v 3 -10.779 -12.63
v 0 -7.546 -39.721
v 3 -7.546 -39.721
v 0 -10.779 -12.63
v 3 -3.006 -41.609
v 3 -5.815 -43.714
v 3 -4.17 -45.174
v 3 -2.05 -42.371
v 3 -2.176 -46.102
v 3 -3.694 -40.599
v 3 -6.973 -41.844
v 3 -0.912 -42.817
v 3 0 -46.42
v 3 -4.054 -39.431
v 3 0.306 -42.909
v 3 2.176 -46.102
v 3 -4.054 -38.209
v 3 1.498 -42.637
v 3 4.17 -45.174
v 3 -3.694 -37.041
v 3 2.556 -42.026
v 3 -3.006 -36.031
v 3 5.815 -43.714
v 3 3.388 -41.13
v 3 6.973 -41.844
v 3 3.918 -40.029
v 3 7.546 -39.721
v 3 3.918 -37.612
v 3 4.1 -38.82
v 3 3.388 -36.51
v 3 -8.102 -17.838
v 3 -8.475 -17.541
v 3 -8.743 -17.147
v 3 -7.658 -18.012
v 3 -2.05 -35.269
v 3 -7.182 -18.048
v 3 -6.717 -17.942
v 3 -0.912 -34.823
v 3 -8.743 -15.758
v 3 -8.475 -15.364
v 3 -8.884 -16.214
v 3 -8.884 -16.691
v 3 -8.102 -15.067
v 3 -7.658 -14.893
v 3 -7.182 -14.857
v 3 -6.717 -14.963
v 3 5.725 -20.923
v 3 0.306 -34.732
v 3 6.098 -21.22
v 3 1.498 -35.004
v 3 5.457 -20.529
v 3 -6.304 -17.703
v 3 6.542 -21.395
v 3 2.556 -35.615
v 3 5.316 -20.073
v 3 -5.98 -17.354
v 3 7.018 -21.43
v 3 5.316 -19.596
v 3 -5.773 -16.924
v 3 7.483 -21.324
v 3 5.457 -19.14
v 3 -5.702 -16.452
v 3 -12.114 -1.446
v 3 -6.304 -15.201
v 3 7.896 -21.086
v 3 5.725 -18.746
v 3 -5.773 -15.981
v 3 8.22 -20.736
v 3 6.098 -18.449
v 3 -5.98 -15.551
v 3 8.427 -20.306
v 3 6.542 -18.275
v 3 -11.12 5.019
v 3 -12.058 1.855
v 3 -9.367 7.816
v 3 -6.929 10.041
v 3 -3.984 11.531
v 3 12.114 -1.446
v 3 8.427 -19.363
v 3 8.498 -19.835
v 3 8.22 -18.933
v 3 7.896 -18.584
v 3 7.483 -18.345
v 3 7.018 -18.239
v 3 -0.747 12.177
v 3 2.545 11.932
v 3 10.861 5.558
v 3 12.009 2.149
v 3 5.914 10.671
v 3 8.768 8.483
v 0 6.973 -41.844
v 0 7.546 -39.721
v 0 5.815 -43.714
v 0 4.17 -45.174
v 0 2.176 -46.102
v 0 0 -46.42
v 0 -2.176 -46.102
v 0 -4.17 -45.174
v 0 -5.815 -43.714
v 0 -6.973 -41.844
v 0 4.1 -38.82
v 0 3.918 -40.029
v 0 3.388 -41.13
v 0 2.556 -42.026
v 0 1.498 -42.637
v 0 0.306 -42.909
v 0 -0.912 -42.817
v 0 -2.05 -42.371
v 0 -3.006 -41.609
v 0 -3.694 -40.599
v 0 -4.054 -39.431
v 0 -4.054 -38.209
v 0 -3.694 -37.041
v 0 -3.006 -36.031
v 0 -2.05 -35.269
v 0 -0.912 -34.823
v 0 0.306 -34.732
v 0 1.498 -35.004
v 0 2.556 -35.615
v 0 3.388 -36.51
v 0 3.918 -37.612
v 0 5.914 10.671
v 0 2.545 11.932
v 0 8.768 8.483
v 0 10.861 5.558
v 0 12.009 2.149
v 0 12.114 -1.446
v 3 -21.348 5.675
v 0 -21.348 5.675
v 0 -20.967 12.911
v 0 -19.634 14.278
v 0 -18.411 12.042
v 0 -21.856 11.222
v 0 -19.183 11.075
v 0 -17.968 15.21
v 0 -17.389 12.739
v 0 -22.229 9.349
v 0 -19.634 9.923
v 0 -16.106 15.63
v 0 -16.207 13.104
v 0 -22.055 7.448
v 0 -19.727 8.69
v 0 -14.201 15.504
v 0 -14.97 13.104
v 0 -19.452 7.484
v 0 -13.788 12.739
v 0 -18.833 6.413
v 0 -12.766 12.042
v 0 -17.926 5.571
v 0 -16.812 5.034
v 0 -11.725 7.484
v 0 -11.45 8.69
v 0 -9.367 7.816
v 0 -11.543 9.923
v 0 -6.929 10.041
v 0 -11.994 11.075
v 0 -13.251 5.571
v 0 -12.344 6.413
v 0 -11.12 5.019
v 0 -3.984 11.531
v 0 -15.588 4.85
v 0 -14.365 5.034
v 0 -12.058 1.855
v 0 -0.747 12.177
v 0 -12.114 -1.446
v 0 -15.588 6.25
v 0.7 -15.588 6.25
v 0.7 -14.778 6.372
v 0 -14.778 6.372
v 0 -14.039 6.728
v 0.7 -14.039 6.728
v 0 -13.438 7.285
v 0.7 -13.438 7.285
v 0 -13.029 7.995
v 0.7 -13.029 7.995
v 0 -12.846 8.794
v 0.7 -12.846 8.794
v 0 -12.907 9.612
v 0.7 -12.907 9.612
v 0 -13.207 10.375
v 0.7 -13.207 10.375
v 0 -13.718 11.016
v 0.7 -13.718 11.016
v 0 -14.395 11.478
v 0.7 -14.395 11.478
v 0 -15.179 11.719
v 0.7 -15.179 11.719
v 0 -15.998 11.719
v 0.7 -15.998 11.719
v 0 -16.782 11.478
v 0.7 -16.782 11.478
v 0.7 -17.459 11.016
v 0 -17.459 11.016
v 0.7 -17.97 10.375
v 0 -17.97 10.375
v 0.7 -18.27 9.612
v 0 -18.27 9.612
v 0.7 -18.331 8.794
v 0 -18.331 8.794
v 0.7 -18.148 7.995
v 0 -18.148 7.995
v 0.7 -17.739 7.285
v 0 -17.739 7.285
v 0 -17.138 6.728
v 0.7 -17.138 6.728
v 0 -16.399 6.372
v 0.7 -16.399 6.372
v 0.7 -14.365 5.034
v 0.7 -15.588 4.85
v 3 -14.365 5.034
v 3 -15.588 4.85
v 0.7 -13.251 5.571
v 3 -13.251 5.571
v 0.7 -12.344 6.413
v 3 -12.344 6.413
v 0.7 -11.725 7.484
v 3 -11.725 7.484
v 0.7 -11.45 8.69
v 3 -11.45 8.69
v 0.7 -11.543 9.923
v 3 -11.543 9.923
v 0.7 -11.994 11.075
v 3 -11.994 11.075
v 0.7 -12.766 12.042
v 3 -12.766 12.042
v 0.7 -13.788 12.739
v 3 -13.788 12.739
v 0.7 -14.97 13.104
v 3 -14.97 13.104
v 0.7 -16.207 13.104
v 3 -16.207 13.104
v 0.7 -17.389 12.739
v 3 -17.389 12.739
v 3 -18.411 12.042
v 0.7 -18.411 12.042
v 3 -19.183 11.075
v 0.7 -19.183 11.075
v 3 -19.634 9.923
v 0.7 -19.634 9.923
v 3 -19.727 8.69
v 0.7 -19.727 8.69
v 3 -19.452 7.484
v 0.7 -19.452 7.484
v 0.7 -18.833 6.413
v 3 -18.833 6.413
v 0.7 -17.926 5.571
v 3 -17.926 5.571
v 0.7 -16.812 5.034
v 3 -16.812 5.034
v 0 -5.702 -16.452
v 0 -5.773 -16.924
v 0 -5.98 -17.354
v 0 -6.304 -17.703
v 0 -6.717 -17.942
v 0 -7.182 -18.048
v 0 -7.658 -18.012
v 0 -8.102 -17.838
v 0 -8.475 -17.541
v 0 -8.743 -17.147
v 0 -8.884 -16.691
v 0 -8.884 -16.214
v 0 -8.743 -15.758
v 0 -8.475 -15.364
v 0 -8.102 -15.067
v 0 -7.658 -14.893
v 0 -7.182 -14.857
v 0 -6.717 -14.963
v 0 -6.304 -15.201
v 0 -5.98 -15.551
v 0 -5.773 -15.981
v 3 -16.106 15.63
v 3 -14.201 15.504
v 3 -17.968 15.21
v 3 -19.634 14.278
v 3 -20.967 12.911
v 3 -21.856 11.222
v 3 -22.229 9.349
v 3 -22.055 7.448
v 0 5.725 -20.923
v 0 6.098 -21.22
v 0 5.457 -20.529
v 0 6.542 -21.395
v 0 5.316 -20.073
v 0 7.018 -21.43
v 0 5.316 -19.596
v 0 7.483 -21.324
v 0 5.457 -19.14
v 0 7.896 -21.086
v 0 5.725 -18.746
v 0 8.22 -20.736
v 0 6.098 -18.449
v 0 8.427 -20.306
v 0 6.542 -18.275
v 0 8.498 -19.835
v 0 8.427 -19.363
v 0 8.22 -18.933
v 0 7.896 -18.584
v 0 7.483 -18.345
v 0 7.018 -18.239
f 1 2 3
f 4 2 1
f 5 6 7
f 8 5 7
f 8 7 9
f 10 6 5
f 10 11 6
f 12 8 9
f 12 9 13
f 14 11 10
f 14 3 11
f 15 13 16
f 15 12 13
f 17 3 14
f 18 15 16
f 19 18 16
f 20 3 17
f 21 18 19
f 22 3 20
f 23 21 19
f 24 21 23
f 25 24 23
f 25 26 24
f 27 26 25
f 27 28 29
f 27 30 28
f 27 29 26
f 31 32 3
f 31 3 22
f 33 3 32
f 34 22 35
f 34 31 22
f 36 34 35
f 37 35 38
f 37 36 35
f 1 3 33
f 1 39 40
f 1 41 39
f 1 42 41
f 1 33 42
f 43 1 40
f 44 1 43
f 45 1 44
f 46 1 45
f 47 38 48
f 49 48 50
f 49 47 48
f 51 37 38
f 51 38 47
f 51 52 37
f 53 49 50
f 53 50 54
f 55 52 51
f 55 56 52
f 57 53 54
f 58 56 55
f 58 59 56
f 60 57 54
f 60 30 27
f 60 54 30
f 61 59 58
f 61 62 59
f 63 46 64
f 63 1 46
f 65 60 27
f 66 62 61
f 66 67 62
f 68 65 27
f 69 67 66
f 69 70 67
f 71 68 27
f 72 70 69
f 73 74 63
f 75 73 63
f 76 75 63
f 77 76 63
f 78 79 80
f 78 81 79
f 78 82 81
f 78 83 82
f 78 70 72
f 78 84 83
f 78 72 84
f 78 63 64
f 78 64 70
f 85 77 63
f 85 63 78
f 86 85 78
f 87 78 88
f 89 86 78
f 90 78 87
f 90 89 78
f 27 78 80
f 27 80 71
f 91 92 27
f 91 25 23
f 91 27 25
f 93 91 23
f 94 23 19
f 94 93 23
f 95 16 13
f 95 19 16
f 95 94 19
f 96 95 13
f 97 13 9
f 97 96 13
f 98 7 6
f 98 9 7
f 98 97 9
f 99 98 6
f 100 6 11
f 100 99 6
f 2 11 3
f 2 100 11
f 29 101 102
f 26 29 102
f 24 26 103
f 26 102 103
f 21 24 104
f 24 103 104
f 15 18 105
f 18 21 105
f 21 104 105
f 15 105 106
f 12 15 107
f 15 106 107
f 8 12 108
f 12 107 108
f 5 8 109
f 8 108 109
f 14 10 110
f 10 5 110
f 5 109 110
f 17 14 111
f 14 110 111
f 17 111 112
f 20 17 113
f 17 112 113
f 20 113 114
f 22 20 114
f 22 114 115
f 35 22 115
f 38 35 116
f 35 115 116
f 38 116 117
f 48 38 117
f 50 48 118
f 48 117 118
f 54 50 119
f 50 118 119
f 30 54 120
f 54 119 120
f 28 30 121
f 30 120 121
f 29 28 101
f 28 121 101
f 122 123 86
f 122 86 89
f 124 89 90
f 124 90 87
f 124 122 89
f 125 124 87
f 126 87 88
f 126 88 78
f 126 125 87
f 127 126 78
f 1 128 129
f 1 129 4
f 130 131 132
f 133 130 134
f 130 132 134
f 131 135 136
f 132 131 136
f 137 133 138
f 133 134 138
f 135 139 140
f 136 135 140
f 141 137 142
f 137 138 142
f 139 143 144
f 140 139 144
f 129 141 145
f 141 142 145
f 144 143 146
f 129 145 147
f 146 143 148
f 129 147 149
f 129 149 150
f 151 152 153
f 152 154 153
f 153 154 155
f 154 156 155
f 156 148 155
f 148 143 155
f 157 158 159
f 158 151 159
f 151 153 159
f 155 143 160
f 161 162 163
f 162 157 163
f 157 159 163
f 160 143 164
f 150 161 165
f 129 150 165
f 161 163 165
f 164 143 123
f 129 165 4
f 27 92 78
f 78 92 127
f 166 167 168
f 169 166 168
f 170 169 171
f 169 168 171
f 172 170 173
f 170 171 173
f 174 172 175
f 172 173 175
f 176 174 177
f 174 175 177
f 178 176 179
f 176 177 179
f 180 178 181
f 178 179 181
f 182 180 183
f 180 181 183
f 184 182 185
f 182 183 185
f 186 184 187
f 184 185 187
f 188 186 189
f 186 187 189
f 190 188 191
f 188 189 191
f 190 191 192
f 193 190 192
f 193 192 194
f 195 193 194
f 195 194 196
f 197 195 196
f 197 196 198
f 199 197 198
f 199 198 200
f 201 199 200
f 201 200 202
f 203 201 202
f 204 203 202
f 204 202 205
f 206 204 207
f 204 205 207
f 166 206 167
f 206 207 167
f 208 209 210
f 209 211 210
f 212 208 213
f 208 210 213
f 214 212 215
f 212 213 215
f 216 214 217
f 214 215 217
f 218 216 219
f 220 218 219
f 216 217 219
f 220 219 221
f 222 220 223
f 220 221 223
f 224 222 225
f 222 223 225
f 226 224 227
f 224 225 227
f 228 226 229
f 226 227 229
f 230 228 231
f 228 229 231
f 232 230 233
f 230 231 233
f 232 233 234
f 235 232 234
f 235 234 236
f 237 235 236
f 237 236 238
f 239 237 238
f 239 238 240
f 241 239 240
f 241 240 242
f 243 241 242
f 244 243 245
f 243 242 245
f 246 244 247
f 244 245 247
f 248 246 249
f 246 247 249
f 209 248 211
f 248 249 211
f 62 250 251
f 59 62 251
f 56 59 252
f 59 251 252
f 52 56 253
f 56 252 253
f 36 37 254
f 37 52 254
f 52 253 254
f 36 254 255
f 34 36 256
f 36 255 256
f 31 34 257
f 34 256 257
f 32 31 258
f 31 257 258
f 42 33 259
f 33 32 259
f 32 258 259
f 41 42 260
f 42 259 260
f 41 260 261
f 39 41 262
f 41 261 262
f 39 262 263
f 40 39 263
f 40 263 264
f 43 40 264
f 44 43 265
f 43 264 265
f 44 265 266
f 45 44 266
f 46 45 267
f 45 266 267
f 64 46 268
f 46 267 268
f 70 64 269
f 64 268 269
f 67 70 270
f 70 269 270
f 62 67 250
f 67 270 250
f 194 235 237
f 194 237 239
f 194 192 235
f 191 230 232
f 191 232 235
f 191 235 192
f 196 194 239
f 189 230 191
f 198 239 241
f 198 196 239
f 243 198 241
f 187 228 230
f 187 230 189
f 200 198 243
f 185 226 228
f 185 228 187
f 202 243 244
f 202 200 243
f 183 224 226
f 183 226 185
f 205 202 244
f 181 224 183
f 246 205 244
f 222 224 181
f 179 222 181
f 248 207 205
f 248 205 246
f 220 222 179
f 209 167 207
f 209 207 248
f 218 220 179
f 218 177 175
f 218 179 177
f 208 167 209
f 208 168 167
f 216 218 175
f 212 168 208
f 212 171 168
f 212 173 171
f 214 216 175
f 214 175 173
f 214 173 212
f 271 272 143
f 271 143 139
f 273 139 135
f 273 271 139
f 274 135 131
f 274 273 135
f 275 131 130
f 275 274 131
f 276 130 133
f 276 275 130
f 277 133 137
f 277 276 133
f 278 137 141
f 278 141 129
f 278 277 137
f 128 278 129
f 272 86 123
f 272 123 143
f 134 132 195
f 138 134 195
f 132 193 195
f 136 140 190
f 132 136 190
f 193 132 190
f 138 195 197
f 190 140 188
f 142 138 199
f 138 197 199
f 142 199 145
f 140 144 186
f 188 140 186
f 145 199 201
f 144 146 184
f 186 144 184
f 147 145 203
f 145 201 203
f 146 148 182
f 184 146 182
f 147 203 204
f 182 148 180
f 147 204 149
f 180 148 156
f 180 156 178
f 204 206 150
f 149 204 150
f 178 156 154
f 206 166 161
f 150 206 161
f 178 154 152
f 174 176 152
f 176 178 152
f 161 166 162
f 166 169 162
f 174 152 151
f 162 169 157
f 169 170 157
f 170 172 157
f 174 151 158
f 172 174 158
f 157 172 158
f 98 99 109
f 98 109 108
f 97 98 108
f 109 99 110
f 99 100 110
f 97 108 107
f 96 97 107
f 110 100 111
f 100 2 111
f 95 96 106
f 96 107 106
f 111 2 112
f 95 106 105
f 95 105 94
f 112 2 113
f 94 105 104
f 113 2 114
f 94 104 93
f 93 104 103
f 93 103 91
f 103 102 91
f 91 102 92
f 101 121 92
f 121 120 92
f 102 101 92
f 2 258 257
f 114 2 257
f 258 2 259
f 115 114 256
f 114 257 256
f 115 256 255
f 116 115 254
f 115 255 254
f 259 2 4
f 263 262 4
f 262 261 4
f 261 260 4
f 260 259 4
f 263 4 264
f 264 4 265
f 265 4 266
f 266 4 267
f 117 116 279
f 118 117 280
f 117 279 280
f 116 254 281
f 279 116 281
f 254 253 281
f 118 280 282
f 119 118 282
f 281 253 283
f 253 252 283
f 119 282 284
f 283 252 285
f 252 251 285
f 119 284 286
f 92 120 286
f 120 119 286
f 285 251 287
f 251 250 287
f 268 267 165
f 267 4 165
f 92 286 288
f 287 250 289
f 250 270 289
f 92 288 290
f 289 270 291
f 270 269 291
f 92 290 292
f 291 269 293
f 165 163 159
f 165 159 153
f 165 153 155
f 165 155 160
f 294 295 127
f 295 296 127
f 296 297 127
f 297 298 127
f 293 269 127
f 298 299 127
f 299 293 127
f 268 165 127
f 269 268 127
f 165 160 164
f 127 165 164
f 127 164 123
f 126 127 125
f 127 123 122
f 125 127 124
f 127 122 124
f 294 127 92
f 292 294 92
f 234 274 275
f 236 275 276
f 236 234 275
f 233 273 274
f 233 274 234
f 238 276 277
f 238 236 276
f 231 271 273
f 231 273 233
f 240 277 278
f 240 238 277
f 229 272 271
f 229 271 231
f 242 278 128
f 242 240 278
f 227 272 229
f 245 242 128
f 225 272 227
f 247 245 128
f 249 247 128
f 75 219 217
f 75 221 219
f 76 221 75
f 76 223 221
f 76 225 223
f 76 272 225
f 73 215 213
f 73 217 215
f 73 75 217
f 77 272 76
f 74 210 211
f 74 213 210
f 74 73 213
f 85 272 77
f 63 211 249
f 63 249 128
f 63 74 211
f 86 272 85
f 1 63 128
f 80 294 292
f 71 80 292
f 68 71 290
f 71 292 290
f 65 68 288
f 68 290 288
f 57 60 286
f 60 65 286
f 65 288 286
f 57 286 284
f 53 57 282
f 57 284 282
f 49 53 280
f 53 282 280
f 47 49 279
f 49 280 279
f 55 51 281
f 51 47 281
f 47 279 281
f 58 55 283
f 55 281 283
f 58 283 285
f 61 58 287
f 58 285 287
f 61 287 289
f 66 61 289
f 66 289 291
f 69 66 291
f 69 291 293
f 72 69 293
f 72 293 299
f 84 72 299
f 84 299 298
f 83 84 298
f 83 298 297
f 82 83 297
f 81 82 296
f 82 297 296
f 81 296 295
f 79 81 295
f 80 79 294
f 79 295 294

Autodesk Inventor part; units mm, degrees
ref_plane "YZ Plane" through (0, 0, 0) normal (1, 0, 0) x (0, 1, 0)
ref_plane "XZ Plane" through (0, 0, 0) normal (0, 1, 0) x (-1, 0, 0)
ref_plane "XY Plane" through (0, 0, 0) normal (0, 0, 1) x (1, 0, 0)
sketch "Эскиз1" plane through (0, 0, 0) normal (1, 0, 0) x (0, 1, 0)
  circle A0 centre (35.2311, -22.6062) radius 9.3
  circle A1 centre (0, -38.8201) radius 6.1 construction
  circle A2 centre (0, 0) radius 4.85 construction
  circle A3 centre (35.8147, -49.5529) radius 3.55
  line L0 (6.0968, -38.6237) -> (4.8475, 0.1562) construction
  line L1 (-4.8475, 0.1562) -> (-6.0968, -38.6237) construction
  line L2 (0, 0) -> (0, -38.8201) construction
  circle A4 centre (0, -38.8201) radius 4.1
  circle A5 centre (0, 0) radius 2.25
  circle A6 centre (0, -38.8201) radius 15 construction
  circle A7 centre (0, 0) radius 14 construction
  circle A8 centre (0, -38.8201) radius 7.6
  circle A9 centre (0, 0) radius 7 construction
  line L3 (7.5465, -39.7207) -> (12.114, -1.4456)
  line L4 (-7.5465, -39.7207) -> (-12.114, -1.4456)
  circle A10 centre (0, 0) radius 8.8 construction
  circle A11 centre (0, 0) radius 12.2
  circle A12 centre (6.8983, -19.8347) radius 1.6
  circle A13 centre (-7.3019, -16.4524) radius 1.6
  point P0 (-7, 0)
  point P1 (-7.5465, -39.7207)
  point P2 (-12.114, -1.4456)
  dimension "d0" = 18.6
  dimension "d1" = 12.2
  dimension "d2" = 9.7
  dimension "d3" = 7.1
  dimension "d8" = 38.8201
  dimension "d13" = 38.8
  dimension "d14" = 38.8
  dimension "d23" = 8.2
  dimension "d24" = 4.5
  dimension "d25" = 30
  dimension "d26" = 28
  dimension "d28" = 14
  dimension "d31" = 17.6
  dimension "d32" = 3.4
  dimension "d56" = 3.5
  dimension "d58" = 3.2
  dimension "d59" = 3
  dimension "d60" = 21
  dimension "d61" = 3.2
  dimension "d62" = 3
  dimension "d63" = 18
extrude "Выдавливание4" add sketch "Эскиз1" along normal blind 3 contours A5 | A8 | A8 L4 A11 L3 | A11
sketch "Эскиз4" plane through (0, 0, 0) normal (-1, 0, 0) x (0, 0, 1)
  circle A0 centre (-6.2, 6.2) radius 1.4
  circle A1 centre (-38.8201, 0) radius 4.1 construction
  arc A2 (-1.4456, -12.114) -> (-1.4456, 12.114) centre (0, 0) ccw construction
  line L0 (-39.7207, 7.5465) -> (-1.4456, 12.114) construction
  arc A3 (-39.7207, 7.5465) -> (-39.7207, -7.5465) centre (-38.8201, 0) ccw construction
  line L1 (-1.4456, -12.114) -> (-39.7207, -7.5465) construction
  line L2 (0, 0) -> (0, 12.2) construction
  arc A4 (-1.4456, -12.114) -> (-1.4456, 12.114) centre (0, 0) ccw construction
  line L3 (0, 0) -> (12.2, 0) construction
  circle A5 centre (6.2, 6.2) radius 1.4
  circle A6 centre (-6.2, -6.2) radius 1.4
  circle A7 centre (6.2, -6.2) radius 1.4
  dimension "d33" = 2.8
  dimension "d34" = 12.4
  dimension "d35" = 12.4
extrude "Выдавливание5" [suppressed]
sketch "Эскиз5" plane through (3, 0, 0) normal (1, 0, 0) x (0, 0, -1)
  circle A0 centre (0, 0) radius 3.75
  dimension "d38" = 7.5
extrude "Выдавливание6" [suppressed]
sketch "Эскиз6" plane through (3, 0, 0) normal (1, 0, 0) x (0, 0, -1)
  circle A0 centre (0, -18) radius 2
  circle A1 centre (38.8201, 0) radius 4.1 construction
  line L0 (39.7207, 7.5465) -> (1.4456, 12.114) construction
  arc A2 (1.4456, 12.114) -> (1.4456, -12.114) centre (0, 0) ccw construction
  line L1 (1.4456, -12.114) -> (39.7207, -7.5465) construction
  arc A3 (39.7207, -7.5465) -> (39.7207, 7.5465) centre (38.8201, 0) ccw construction
  line L2 (0, 0) -> (0, -26.6004) construction
  circle A4 centre (0, 0) radius 14 construction
  line L3 (-10.8605, -5.5578) -> (-3.5608, -19.8222)
  arc A5 (0, -14) -> (-3.5608, -19.8222) centre (0, -18) ccw construction
  line L4 (2.8284, -20.8284) -> (12.911, -10.7458)
  line L5 (1.4456, -12.114) -> (39.7207, -7.5465) construction
  arc A6 (2.8284, -20.8284) -> (0, -14) centre (0, -18) ccw construction
  arc A7 (-3.5608, -19.8222) -> (2.8284, -20.8284) centre (0, -18) ccw
  line L6 (-10.8605, -5.5578) -> (-10.1465, -5.5578)
  line L7 (-10.1465, -5.5578) -> (-6.8136, -9.4237)
  line L8 (-6.8136, -9.4237) -> (5.1237, -10.512)
  line L9 (5.1237, -10.512) -> (12.911, -10.7458)
  dimension "d42" = 28
  dimension "d41" = 4
  dimension "d43" = 18
  dimension "d44" = 8
  dimension "d45" = 45
extrude "Выдавливание7" [suppressed]
sketch "Эскиз7" plane through (3, 0, 0) normal (1, 0, 0) x (0, 0, -1)
  line L0 (0, 0) -> (0, -29.4139) construction
  circle A0 centre (-9, -15.5885) radius 4.15
  line L1 (-9, -15.5885) -> (0, 0) construction
  circle A1 centre (0, 0) radius 14 construction
  circle A2 centre (0, 0) radius 18 construction
  arc A3 (-5.675, -21.3475) -> (-15.5037, -14.2012) centre (-9, -15.5885) ccw construction
  circle A4 centre (38.8201, 0) radius 4.1 construction
  line L2 (39.7207, 7.5465) -> (1.4456, 12.114) construction
  arc A5 (1.4456, 12.114) -> (1.4456, -12.114) centre (0, 0) ccw projected
  line L3 (1.4456, -12.114) -> (39.7207, -7.5465) projected
  arc A6 (39.7207, -7.5465) -> (39.7207, 7.5465) centre (38.8201, 0) ccw construction
  line L4 (-11.9316, 2.5451) -> (-15.5037, -14.2012)
  line L5 (-5.675, -21.3475) -> (12.6295, -10.7794)
  line L6 (1.4456, -12.114) -> (39.7207, -7.5465) construction
  arc A7 (-15.5037, -14.2012) -> (-5.675, -21.3475) centre (-9, -15.5885) ccw
  circle A8 centre (-9, -15.5885) radius 2.75
  dimension "d48" = 8.3
  dimension "d49" = 330
  dimension "d50" = 28
  dimension "d51" = 4
  dimension "d53" = 30
  dimension "d57" = 2.5
  dimension "d64" = 5.5
extrude "Выдавливание8" add sketch "Эскиз7" against normal up to surface (3 mm away) contours A5 L3 L5 A7 L4
extrude "Выдавливание9" add sketch "Эскиз7" against normal up to surface (3 mm away) contours A0
extrude "Выдавливание10" cut sketch "Эскиз7" against normal blind 2.3 contours A0
properties part number "_3DПЕЧАТЬ"
